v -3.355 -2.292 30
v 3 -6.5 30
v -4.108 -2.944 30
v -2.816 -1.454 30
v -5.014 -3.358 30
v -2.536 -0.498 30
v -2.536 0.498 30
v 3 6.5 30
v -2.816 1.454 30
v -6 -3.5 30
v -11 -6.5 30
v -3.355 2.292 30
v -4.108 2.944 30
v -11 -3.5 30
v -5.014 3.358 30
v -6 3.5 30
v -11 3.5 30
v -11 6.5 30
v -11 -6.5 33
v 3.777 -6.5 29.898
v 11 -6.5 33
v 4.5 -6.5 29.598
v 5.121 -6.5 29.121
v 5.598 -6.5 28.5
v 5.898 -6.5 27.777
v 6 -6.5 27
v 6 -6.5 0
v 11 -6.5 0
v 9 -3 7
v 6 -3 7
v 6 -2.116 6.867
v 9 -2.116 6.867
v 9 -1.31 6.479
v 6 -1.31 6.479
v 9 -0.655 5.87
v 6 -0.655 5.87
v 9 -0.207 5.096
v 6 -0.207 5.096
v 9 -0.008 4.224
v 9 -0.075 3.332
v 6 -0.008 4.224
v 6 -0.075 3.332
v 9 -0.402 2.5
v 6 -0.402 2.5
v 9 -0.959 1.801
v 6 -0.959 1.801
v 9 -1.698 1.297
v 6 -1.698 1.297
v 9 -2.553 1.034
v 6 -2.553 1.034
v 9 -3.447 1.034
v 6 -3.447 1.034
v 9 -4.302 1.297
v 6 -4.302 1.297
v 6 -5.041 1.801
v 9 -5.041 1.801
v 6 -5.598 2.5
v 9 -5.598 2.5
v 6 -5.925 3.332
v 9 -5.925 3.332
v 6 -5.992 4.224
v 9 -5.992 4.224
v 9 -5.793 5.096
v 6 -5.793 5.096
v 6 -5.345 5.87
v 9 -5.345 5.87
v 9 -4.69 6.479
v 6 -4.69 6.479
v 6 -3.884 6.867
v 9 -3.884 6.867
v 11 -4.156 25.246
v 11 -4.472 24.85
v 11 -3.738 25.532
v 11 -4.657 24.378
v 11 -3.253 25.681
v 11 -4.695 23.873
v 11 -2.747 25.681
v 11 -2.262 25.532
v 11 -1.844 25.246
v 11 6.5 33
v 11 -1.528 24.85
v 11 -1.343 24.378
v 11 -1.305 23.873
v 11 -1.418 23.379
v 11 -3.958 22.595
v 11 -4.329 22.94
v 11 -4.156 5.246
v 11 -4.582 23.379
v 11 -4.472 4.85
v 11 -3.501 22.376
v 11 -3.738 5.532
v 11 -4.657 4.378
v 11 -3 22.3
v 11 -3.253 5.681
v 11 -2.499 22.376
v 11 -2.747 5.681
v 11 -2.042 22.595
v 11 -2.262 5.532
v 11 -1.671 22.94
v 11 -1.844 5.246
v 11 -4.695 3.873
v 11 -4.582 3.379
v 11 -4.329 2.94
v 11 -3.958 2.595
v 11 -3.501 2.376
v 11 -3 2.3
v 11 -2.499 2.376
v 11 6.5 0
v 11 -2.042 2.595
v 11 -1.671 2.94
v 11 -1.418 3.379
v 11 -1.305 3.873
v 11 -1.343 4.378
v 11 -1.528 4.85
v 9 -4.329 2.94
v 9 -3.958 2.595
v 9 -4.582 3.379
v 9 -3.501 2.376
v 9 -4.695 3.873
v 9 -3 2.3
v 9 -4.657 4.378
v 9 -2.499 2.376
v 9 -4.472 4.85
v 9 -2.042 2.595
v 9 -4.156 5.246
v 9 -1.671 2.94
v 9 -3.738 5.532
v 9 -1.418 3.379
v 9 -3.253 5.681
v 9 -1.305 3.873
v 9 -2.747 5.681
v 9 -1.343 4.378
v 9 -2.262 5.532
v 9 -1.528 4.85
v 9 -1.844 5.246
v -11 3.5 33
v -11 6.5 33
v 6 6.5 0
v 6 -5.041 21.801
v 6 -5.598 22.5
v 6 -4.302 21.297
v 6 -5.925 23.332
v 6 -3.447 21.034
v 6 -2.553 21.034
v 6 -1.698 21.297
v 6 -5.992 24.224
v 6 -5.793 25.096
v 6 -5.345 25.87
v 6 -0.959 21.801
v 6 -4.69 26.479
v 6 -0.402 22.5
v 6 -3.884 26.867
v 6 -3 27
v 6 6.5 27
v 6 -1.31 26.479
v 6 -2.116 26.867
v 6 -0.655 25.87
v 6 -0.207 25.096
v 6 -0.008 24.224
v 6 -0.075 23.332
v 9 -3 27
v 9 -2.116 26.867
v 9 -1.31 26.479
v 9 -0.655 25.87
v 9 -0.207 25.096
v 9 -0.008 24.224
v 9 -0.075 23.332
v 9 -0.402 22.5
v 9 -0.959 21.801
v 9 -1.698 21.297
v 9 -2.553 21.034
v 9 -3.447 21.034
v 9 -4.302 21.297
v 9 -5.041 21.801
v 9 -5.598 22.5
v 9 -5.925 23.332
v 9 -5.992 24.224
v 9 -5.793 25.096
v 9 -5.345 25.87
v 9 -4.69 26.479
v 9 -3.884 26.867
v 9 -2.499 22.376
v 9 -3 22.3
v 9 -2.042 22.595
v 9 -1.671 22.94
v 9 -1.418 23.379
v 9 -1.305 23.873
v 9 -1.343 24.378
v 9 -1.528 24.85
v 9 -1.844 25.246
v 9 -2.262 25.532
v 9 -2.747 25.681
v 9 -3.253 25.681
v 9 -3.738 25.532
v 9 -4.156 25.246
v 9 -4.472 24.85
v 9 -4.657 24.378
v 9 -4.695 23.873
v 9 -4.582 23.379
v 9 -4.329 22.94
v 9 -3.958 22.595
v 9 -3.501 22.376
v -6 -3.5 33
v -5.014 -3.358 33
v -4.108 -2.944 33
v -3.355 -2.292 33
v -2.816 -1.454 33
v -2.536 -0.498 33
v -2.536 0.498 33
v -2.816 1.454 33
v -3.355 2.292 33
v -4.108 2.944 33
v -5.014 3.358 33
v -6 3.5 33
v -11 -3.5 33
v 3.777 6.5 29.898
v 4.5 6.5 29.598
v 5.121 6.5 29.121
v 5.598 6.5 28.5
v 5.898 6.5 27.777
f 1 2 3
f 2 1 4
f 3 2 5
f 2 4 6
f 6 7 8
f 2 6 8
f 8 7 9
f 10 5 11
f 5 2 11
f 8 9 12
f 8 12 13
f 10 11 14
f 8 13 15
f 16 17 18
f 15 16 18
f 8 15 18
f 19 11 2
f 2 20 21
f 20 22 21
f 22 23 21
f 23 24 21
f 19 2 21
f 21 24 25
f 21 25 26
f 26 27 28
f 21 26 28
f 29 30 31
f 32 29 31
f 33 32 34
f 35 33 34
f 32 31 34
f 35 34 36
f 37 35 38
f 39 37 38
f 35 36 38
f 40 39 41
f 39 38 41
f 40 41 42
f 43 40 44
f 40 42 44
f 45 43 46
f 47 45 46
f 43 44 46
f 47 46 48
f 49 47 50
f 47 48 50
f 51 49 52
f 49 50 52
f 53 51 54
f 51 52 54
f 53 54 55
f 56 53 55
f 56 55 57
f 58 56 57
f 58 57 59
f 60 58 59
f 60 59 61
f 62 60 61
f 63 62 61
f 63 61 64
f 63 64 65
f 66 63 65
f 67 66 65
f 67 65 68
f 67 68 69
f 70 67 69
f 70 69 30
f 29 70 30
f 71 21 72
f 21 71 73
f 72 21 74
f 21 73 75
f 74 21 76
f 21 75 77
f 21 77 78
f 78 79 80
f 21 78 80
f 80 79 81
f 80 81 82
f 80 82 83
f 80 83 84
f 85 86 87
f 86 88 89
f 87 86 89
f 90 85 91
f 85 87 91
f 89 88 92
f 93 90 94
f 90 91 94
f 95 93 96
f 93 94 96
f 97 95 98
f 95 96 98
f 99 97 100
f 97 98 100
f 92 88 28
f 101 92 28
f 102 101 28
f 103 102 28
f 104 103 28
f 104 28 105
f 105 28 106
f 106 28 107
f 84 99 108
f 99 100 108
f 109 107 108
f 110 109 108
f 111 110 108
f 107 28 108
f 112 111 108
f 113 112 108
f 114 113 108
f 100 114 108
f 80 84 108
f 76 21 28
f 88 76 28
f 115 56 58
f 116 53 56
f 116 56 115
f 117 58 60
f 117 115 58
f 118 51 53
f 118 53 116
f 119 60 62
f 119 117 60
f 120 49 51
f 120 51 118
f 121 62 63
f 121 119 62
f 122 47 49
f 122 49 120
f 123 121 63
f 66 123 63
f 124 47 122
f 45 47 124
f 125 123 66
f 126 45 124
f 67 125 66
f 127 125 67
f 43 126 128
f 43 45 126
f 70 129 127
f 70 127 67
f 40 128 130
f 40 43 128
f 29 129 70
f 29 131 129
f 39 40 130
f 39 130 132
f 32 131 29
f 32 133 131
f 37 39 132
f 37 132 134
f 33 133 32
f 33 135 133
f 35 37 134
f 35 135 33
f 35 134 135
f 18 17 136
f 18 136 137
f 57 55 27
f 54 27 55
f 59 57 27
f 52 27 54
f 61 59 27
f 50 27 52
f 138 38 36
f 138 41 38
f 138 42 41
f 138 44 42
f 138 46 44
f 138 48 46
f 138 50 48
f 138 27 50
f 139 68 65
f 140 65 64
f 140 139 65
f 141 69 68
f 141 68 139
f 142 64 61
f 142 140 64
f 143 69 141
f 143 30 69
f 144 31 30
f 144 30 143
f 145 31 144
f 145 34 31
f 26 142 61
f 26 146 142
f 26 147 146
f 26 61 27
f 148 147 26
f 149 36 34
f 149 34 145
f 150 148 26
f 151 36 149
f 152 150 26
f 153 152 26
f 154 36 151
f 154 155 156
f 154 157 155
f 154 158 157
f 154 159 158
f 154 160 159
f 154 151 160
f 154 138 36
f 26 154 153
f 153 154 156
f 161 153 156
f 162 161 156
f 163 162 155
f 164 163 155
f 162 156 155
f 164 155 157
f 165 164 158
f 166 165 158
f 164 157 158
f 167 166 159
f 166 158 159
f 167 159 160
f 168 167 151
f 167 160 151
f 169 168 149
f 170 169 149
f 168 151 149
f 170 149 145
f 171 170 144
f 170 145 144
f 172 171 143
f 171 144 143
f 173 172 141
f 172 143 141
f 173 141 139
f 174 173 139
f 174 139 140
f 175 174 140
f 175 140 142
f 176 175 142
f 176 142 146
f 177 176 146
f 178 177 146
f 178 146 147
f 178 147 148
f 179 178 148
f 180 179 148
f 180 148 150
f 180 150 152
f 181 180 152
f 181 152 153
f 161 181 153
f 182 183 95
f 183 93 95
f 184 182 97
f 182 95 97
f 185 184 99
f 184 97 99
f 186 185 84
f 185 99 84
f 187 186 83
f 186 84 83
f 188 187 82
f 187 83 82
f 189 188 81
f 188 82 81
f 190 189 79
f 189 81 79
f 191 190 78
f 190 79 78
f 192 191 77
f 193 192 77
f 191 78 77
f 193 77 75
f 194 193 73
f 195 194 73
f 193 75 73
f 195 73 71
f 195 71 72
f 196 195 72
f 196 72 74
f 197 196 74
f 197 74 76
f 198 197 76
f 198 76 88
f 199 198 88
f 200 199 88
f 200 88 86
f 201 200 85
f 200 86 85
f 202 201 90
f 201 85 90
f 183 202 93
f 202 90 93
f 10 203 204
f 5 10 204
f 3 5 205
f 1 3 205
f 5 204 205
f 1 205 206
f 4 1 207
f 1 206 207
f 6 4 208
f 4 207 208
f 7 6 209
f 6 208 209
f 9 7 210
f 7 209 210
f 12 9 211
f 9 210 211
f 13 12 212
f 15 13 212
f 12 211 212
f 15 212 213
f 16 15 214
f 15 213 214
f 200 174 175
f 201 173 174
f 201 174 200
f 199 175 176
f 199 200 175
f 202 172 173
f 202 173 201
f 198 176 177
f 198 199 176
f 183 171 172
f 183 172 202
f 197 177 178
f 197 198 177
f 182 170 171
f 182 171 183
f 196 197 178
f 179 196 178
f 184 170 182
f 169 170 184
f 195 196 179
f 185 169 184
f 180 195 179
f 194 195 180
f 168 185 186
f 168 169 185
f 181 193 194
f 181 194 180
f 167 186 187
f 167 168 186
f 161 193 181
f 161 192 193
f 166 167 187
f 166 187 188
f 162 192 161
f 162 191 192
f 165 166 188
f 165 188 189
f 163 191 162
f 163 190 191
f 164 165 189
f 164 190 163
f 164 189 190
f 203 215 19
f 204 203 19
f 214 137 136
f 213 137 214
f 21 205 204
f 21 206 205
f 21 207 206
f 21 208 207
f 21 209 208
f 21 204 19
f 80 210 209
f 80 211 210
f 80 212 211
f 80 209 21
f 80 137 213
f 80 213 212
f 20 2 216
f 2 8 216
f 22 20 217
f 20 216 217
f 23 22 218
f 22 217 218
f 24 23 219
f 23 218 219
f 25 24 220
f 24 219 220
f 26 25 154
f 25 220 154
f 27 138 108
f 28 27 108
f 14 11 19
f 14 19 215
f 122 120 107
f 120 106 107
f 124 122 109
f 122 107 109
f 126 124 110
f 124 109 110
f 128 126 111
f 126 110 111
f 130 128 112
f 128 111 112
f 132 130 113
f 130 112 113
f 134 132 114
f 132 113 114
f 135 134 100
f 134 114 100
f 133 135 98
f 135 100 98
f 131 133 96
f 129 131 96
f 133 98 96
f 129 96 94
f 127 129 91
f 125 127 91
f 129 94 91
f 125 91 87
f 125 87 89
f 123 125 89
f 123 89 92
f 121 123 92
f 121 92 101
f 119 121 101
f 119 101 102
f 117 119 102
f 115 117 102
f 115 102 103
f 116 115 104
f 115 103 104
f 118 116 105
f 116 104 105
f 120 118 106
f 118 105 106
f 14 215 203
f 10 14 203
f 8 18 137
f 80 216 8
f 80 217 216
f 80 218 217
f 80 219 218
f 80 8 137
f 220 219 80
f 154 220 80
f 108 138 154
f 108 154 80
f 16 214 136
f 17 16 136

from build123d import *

# Parameters (mm, degrees)
SKETCH_1_W                = 22
SKETCH_1_H                = 13
EXTRUDE_1_DEPTH           = 33
SKETCH_5_W                = 30
SKETCH_5_H                = 13
CUT_EXTRUDE_2_DEPTH       = 17
HOLE_WIZARD_1_D           = 3.4
HOLE_WIZARD_1_CBORE_D     = 6
HOLE_WIZARD_1_CBORE_DEPTH = 3
CUT_EXTRUDE_4_DEPTH       = 36.387144558
FILLET_1_R                = 3


with BuildPart() as part:
    # 草图1 → 凸台-拉伸1 (new body)
    with BuildSketch(Plane.XY):
        Rectangle(SKETCH_1_W, SKETCH_1_H)
    extrude(amount=EXTRUDE_1_DEPTH)

    # 草图5 → 切除-拉伸2 (cut)
    with BuildSketch(Plane.ZY.offset(11)):
        with Locations((15, 0)):
            Rectangle(SKETCH_5_W, SKETCH_5_H)
    extrude(amount=-CUT_EXTRUDE_2_DEPTH, mode=Mode.SUBTRACT)

    # 打孔尺寸根据内六角圆柱头螺钉的类型1 (through all)
    with Locations(Plane(origin=(6, 5.532872615, -4.059557146), x_dir=(0, 0, 1), z_dir=(-1, 0, 0))):
        with Locations((28.059557146, -8.532872615), (8.059557146, -8.532872615)):
            CounterBoreHole(HOLE_WIZARD_1_D / 2, HOLE_WIZARD_1_CBORE_D / 2, HOLE_WIZARD_1_CBORE_DEPTH)

    # 草图12 → 切除-拉伸4 (cut, through all)
    with BuildSketch(Plane.XY.offset(33)):
        with BuildLine():
            Line((-11, -3.5), (-6, -3.5))
            ThreePointArc((-6, -3.5), (-2.5, 0), (-6, 3.5))
            Line((-6, 3.5), (-11, 3.5))
            Line((-11, 3.5), (-11, -3.5))
        make_face()
    extrude(amount=-CUT_EXTRUDE_4_DEPTH, mode=Mode.SUBTRACT)

    # 圆角1
    fillet_1_edges = [part.edges().sort_by_distance(p)[0] for p in [
        (6, 0, 30),
    ]]
    fillet(fillet_1_edges, radius=FILLET_1_R - 0.0001)  # a hair under: the kernel refuses the full size


solid = part.part
